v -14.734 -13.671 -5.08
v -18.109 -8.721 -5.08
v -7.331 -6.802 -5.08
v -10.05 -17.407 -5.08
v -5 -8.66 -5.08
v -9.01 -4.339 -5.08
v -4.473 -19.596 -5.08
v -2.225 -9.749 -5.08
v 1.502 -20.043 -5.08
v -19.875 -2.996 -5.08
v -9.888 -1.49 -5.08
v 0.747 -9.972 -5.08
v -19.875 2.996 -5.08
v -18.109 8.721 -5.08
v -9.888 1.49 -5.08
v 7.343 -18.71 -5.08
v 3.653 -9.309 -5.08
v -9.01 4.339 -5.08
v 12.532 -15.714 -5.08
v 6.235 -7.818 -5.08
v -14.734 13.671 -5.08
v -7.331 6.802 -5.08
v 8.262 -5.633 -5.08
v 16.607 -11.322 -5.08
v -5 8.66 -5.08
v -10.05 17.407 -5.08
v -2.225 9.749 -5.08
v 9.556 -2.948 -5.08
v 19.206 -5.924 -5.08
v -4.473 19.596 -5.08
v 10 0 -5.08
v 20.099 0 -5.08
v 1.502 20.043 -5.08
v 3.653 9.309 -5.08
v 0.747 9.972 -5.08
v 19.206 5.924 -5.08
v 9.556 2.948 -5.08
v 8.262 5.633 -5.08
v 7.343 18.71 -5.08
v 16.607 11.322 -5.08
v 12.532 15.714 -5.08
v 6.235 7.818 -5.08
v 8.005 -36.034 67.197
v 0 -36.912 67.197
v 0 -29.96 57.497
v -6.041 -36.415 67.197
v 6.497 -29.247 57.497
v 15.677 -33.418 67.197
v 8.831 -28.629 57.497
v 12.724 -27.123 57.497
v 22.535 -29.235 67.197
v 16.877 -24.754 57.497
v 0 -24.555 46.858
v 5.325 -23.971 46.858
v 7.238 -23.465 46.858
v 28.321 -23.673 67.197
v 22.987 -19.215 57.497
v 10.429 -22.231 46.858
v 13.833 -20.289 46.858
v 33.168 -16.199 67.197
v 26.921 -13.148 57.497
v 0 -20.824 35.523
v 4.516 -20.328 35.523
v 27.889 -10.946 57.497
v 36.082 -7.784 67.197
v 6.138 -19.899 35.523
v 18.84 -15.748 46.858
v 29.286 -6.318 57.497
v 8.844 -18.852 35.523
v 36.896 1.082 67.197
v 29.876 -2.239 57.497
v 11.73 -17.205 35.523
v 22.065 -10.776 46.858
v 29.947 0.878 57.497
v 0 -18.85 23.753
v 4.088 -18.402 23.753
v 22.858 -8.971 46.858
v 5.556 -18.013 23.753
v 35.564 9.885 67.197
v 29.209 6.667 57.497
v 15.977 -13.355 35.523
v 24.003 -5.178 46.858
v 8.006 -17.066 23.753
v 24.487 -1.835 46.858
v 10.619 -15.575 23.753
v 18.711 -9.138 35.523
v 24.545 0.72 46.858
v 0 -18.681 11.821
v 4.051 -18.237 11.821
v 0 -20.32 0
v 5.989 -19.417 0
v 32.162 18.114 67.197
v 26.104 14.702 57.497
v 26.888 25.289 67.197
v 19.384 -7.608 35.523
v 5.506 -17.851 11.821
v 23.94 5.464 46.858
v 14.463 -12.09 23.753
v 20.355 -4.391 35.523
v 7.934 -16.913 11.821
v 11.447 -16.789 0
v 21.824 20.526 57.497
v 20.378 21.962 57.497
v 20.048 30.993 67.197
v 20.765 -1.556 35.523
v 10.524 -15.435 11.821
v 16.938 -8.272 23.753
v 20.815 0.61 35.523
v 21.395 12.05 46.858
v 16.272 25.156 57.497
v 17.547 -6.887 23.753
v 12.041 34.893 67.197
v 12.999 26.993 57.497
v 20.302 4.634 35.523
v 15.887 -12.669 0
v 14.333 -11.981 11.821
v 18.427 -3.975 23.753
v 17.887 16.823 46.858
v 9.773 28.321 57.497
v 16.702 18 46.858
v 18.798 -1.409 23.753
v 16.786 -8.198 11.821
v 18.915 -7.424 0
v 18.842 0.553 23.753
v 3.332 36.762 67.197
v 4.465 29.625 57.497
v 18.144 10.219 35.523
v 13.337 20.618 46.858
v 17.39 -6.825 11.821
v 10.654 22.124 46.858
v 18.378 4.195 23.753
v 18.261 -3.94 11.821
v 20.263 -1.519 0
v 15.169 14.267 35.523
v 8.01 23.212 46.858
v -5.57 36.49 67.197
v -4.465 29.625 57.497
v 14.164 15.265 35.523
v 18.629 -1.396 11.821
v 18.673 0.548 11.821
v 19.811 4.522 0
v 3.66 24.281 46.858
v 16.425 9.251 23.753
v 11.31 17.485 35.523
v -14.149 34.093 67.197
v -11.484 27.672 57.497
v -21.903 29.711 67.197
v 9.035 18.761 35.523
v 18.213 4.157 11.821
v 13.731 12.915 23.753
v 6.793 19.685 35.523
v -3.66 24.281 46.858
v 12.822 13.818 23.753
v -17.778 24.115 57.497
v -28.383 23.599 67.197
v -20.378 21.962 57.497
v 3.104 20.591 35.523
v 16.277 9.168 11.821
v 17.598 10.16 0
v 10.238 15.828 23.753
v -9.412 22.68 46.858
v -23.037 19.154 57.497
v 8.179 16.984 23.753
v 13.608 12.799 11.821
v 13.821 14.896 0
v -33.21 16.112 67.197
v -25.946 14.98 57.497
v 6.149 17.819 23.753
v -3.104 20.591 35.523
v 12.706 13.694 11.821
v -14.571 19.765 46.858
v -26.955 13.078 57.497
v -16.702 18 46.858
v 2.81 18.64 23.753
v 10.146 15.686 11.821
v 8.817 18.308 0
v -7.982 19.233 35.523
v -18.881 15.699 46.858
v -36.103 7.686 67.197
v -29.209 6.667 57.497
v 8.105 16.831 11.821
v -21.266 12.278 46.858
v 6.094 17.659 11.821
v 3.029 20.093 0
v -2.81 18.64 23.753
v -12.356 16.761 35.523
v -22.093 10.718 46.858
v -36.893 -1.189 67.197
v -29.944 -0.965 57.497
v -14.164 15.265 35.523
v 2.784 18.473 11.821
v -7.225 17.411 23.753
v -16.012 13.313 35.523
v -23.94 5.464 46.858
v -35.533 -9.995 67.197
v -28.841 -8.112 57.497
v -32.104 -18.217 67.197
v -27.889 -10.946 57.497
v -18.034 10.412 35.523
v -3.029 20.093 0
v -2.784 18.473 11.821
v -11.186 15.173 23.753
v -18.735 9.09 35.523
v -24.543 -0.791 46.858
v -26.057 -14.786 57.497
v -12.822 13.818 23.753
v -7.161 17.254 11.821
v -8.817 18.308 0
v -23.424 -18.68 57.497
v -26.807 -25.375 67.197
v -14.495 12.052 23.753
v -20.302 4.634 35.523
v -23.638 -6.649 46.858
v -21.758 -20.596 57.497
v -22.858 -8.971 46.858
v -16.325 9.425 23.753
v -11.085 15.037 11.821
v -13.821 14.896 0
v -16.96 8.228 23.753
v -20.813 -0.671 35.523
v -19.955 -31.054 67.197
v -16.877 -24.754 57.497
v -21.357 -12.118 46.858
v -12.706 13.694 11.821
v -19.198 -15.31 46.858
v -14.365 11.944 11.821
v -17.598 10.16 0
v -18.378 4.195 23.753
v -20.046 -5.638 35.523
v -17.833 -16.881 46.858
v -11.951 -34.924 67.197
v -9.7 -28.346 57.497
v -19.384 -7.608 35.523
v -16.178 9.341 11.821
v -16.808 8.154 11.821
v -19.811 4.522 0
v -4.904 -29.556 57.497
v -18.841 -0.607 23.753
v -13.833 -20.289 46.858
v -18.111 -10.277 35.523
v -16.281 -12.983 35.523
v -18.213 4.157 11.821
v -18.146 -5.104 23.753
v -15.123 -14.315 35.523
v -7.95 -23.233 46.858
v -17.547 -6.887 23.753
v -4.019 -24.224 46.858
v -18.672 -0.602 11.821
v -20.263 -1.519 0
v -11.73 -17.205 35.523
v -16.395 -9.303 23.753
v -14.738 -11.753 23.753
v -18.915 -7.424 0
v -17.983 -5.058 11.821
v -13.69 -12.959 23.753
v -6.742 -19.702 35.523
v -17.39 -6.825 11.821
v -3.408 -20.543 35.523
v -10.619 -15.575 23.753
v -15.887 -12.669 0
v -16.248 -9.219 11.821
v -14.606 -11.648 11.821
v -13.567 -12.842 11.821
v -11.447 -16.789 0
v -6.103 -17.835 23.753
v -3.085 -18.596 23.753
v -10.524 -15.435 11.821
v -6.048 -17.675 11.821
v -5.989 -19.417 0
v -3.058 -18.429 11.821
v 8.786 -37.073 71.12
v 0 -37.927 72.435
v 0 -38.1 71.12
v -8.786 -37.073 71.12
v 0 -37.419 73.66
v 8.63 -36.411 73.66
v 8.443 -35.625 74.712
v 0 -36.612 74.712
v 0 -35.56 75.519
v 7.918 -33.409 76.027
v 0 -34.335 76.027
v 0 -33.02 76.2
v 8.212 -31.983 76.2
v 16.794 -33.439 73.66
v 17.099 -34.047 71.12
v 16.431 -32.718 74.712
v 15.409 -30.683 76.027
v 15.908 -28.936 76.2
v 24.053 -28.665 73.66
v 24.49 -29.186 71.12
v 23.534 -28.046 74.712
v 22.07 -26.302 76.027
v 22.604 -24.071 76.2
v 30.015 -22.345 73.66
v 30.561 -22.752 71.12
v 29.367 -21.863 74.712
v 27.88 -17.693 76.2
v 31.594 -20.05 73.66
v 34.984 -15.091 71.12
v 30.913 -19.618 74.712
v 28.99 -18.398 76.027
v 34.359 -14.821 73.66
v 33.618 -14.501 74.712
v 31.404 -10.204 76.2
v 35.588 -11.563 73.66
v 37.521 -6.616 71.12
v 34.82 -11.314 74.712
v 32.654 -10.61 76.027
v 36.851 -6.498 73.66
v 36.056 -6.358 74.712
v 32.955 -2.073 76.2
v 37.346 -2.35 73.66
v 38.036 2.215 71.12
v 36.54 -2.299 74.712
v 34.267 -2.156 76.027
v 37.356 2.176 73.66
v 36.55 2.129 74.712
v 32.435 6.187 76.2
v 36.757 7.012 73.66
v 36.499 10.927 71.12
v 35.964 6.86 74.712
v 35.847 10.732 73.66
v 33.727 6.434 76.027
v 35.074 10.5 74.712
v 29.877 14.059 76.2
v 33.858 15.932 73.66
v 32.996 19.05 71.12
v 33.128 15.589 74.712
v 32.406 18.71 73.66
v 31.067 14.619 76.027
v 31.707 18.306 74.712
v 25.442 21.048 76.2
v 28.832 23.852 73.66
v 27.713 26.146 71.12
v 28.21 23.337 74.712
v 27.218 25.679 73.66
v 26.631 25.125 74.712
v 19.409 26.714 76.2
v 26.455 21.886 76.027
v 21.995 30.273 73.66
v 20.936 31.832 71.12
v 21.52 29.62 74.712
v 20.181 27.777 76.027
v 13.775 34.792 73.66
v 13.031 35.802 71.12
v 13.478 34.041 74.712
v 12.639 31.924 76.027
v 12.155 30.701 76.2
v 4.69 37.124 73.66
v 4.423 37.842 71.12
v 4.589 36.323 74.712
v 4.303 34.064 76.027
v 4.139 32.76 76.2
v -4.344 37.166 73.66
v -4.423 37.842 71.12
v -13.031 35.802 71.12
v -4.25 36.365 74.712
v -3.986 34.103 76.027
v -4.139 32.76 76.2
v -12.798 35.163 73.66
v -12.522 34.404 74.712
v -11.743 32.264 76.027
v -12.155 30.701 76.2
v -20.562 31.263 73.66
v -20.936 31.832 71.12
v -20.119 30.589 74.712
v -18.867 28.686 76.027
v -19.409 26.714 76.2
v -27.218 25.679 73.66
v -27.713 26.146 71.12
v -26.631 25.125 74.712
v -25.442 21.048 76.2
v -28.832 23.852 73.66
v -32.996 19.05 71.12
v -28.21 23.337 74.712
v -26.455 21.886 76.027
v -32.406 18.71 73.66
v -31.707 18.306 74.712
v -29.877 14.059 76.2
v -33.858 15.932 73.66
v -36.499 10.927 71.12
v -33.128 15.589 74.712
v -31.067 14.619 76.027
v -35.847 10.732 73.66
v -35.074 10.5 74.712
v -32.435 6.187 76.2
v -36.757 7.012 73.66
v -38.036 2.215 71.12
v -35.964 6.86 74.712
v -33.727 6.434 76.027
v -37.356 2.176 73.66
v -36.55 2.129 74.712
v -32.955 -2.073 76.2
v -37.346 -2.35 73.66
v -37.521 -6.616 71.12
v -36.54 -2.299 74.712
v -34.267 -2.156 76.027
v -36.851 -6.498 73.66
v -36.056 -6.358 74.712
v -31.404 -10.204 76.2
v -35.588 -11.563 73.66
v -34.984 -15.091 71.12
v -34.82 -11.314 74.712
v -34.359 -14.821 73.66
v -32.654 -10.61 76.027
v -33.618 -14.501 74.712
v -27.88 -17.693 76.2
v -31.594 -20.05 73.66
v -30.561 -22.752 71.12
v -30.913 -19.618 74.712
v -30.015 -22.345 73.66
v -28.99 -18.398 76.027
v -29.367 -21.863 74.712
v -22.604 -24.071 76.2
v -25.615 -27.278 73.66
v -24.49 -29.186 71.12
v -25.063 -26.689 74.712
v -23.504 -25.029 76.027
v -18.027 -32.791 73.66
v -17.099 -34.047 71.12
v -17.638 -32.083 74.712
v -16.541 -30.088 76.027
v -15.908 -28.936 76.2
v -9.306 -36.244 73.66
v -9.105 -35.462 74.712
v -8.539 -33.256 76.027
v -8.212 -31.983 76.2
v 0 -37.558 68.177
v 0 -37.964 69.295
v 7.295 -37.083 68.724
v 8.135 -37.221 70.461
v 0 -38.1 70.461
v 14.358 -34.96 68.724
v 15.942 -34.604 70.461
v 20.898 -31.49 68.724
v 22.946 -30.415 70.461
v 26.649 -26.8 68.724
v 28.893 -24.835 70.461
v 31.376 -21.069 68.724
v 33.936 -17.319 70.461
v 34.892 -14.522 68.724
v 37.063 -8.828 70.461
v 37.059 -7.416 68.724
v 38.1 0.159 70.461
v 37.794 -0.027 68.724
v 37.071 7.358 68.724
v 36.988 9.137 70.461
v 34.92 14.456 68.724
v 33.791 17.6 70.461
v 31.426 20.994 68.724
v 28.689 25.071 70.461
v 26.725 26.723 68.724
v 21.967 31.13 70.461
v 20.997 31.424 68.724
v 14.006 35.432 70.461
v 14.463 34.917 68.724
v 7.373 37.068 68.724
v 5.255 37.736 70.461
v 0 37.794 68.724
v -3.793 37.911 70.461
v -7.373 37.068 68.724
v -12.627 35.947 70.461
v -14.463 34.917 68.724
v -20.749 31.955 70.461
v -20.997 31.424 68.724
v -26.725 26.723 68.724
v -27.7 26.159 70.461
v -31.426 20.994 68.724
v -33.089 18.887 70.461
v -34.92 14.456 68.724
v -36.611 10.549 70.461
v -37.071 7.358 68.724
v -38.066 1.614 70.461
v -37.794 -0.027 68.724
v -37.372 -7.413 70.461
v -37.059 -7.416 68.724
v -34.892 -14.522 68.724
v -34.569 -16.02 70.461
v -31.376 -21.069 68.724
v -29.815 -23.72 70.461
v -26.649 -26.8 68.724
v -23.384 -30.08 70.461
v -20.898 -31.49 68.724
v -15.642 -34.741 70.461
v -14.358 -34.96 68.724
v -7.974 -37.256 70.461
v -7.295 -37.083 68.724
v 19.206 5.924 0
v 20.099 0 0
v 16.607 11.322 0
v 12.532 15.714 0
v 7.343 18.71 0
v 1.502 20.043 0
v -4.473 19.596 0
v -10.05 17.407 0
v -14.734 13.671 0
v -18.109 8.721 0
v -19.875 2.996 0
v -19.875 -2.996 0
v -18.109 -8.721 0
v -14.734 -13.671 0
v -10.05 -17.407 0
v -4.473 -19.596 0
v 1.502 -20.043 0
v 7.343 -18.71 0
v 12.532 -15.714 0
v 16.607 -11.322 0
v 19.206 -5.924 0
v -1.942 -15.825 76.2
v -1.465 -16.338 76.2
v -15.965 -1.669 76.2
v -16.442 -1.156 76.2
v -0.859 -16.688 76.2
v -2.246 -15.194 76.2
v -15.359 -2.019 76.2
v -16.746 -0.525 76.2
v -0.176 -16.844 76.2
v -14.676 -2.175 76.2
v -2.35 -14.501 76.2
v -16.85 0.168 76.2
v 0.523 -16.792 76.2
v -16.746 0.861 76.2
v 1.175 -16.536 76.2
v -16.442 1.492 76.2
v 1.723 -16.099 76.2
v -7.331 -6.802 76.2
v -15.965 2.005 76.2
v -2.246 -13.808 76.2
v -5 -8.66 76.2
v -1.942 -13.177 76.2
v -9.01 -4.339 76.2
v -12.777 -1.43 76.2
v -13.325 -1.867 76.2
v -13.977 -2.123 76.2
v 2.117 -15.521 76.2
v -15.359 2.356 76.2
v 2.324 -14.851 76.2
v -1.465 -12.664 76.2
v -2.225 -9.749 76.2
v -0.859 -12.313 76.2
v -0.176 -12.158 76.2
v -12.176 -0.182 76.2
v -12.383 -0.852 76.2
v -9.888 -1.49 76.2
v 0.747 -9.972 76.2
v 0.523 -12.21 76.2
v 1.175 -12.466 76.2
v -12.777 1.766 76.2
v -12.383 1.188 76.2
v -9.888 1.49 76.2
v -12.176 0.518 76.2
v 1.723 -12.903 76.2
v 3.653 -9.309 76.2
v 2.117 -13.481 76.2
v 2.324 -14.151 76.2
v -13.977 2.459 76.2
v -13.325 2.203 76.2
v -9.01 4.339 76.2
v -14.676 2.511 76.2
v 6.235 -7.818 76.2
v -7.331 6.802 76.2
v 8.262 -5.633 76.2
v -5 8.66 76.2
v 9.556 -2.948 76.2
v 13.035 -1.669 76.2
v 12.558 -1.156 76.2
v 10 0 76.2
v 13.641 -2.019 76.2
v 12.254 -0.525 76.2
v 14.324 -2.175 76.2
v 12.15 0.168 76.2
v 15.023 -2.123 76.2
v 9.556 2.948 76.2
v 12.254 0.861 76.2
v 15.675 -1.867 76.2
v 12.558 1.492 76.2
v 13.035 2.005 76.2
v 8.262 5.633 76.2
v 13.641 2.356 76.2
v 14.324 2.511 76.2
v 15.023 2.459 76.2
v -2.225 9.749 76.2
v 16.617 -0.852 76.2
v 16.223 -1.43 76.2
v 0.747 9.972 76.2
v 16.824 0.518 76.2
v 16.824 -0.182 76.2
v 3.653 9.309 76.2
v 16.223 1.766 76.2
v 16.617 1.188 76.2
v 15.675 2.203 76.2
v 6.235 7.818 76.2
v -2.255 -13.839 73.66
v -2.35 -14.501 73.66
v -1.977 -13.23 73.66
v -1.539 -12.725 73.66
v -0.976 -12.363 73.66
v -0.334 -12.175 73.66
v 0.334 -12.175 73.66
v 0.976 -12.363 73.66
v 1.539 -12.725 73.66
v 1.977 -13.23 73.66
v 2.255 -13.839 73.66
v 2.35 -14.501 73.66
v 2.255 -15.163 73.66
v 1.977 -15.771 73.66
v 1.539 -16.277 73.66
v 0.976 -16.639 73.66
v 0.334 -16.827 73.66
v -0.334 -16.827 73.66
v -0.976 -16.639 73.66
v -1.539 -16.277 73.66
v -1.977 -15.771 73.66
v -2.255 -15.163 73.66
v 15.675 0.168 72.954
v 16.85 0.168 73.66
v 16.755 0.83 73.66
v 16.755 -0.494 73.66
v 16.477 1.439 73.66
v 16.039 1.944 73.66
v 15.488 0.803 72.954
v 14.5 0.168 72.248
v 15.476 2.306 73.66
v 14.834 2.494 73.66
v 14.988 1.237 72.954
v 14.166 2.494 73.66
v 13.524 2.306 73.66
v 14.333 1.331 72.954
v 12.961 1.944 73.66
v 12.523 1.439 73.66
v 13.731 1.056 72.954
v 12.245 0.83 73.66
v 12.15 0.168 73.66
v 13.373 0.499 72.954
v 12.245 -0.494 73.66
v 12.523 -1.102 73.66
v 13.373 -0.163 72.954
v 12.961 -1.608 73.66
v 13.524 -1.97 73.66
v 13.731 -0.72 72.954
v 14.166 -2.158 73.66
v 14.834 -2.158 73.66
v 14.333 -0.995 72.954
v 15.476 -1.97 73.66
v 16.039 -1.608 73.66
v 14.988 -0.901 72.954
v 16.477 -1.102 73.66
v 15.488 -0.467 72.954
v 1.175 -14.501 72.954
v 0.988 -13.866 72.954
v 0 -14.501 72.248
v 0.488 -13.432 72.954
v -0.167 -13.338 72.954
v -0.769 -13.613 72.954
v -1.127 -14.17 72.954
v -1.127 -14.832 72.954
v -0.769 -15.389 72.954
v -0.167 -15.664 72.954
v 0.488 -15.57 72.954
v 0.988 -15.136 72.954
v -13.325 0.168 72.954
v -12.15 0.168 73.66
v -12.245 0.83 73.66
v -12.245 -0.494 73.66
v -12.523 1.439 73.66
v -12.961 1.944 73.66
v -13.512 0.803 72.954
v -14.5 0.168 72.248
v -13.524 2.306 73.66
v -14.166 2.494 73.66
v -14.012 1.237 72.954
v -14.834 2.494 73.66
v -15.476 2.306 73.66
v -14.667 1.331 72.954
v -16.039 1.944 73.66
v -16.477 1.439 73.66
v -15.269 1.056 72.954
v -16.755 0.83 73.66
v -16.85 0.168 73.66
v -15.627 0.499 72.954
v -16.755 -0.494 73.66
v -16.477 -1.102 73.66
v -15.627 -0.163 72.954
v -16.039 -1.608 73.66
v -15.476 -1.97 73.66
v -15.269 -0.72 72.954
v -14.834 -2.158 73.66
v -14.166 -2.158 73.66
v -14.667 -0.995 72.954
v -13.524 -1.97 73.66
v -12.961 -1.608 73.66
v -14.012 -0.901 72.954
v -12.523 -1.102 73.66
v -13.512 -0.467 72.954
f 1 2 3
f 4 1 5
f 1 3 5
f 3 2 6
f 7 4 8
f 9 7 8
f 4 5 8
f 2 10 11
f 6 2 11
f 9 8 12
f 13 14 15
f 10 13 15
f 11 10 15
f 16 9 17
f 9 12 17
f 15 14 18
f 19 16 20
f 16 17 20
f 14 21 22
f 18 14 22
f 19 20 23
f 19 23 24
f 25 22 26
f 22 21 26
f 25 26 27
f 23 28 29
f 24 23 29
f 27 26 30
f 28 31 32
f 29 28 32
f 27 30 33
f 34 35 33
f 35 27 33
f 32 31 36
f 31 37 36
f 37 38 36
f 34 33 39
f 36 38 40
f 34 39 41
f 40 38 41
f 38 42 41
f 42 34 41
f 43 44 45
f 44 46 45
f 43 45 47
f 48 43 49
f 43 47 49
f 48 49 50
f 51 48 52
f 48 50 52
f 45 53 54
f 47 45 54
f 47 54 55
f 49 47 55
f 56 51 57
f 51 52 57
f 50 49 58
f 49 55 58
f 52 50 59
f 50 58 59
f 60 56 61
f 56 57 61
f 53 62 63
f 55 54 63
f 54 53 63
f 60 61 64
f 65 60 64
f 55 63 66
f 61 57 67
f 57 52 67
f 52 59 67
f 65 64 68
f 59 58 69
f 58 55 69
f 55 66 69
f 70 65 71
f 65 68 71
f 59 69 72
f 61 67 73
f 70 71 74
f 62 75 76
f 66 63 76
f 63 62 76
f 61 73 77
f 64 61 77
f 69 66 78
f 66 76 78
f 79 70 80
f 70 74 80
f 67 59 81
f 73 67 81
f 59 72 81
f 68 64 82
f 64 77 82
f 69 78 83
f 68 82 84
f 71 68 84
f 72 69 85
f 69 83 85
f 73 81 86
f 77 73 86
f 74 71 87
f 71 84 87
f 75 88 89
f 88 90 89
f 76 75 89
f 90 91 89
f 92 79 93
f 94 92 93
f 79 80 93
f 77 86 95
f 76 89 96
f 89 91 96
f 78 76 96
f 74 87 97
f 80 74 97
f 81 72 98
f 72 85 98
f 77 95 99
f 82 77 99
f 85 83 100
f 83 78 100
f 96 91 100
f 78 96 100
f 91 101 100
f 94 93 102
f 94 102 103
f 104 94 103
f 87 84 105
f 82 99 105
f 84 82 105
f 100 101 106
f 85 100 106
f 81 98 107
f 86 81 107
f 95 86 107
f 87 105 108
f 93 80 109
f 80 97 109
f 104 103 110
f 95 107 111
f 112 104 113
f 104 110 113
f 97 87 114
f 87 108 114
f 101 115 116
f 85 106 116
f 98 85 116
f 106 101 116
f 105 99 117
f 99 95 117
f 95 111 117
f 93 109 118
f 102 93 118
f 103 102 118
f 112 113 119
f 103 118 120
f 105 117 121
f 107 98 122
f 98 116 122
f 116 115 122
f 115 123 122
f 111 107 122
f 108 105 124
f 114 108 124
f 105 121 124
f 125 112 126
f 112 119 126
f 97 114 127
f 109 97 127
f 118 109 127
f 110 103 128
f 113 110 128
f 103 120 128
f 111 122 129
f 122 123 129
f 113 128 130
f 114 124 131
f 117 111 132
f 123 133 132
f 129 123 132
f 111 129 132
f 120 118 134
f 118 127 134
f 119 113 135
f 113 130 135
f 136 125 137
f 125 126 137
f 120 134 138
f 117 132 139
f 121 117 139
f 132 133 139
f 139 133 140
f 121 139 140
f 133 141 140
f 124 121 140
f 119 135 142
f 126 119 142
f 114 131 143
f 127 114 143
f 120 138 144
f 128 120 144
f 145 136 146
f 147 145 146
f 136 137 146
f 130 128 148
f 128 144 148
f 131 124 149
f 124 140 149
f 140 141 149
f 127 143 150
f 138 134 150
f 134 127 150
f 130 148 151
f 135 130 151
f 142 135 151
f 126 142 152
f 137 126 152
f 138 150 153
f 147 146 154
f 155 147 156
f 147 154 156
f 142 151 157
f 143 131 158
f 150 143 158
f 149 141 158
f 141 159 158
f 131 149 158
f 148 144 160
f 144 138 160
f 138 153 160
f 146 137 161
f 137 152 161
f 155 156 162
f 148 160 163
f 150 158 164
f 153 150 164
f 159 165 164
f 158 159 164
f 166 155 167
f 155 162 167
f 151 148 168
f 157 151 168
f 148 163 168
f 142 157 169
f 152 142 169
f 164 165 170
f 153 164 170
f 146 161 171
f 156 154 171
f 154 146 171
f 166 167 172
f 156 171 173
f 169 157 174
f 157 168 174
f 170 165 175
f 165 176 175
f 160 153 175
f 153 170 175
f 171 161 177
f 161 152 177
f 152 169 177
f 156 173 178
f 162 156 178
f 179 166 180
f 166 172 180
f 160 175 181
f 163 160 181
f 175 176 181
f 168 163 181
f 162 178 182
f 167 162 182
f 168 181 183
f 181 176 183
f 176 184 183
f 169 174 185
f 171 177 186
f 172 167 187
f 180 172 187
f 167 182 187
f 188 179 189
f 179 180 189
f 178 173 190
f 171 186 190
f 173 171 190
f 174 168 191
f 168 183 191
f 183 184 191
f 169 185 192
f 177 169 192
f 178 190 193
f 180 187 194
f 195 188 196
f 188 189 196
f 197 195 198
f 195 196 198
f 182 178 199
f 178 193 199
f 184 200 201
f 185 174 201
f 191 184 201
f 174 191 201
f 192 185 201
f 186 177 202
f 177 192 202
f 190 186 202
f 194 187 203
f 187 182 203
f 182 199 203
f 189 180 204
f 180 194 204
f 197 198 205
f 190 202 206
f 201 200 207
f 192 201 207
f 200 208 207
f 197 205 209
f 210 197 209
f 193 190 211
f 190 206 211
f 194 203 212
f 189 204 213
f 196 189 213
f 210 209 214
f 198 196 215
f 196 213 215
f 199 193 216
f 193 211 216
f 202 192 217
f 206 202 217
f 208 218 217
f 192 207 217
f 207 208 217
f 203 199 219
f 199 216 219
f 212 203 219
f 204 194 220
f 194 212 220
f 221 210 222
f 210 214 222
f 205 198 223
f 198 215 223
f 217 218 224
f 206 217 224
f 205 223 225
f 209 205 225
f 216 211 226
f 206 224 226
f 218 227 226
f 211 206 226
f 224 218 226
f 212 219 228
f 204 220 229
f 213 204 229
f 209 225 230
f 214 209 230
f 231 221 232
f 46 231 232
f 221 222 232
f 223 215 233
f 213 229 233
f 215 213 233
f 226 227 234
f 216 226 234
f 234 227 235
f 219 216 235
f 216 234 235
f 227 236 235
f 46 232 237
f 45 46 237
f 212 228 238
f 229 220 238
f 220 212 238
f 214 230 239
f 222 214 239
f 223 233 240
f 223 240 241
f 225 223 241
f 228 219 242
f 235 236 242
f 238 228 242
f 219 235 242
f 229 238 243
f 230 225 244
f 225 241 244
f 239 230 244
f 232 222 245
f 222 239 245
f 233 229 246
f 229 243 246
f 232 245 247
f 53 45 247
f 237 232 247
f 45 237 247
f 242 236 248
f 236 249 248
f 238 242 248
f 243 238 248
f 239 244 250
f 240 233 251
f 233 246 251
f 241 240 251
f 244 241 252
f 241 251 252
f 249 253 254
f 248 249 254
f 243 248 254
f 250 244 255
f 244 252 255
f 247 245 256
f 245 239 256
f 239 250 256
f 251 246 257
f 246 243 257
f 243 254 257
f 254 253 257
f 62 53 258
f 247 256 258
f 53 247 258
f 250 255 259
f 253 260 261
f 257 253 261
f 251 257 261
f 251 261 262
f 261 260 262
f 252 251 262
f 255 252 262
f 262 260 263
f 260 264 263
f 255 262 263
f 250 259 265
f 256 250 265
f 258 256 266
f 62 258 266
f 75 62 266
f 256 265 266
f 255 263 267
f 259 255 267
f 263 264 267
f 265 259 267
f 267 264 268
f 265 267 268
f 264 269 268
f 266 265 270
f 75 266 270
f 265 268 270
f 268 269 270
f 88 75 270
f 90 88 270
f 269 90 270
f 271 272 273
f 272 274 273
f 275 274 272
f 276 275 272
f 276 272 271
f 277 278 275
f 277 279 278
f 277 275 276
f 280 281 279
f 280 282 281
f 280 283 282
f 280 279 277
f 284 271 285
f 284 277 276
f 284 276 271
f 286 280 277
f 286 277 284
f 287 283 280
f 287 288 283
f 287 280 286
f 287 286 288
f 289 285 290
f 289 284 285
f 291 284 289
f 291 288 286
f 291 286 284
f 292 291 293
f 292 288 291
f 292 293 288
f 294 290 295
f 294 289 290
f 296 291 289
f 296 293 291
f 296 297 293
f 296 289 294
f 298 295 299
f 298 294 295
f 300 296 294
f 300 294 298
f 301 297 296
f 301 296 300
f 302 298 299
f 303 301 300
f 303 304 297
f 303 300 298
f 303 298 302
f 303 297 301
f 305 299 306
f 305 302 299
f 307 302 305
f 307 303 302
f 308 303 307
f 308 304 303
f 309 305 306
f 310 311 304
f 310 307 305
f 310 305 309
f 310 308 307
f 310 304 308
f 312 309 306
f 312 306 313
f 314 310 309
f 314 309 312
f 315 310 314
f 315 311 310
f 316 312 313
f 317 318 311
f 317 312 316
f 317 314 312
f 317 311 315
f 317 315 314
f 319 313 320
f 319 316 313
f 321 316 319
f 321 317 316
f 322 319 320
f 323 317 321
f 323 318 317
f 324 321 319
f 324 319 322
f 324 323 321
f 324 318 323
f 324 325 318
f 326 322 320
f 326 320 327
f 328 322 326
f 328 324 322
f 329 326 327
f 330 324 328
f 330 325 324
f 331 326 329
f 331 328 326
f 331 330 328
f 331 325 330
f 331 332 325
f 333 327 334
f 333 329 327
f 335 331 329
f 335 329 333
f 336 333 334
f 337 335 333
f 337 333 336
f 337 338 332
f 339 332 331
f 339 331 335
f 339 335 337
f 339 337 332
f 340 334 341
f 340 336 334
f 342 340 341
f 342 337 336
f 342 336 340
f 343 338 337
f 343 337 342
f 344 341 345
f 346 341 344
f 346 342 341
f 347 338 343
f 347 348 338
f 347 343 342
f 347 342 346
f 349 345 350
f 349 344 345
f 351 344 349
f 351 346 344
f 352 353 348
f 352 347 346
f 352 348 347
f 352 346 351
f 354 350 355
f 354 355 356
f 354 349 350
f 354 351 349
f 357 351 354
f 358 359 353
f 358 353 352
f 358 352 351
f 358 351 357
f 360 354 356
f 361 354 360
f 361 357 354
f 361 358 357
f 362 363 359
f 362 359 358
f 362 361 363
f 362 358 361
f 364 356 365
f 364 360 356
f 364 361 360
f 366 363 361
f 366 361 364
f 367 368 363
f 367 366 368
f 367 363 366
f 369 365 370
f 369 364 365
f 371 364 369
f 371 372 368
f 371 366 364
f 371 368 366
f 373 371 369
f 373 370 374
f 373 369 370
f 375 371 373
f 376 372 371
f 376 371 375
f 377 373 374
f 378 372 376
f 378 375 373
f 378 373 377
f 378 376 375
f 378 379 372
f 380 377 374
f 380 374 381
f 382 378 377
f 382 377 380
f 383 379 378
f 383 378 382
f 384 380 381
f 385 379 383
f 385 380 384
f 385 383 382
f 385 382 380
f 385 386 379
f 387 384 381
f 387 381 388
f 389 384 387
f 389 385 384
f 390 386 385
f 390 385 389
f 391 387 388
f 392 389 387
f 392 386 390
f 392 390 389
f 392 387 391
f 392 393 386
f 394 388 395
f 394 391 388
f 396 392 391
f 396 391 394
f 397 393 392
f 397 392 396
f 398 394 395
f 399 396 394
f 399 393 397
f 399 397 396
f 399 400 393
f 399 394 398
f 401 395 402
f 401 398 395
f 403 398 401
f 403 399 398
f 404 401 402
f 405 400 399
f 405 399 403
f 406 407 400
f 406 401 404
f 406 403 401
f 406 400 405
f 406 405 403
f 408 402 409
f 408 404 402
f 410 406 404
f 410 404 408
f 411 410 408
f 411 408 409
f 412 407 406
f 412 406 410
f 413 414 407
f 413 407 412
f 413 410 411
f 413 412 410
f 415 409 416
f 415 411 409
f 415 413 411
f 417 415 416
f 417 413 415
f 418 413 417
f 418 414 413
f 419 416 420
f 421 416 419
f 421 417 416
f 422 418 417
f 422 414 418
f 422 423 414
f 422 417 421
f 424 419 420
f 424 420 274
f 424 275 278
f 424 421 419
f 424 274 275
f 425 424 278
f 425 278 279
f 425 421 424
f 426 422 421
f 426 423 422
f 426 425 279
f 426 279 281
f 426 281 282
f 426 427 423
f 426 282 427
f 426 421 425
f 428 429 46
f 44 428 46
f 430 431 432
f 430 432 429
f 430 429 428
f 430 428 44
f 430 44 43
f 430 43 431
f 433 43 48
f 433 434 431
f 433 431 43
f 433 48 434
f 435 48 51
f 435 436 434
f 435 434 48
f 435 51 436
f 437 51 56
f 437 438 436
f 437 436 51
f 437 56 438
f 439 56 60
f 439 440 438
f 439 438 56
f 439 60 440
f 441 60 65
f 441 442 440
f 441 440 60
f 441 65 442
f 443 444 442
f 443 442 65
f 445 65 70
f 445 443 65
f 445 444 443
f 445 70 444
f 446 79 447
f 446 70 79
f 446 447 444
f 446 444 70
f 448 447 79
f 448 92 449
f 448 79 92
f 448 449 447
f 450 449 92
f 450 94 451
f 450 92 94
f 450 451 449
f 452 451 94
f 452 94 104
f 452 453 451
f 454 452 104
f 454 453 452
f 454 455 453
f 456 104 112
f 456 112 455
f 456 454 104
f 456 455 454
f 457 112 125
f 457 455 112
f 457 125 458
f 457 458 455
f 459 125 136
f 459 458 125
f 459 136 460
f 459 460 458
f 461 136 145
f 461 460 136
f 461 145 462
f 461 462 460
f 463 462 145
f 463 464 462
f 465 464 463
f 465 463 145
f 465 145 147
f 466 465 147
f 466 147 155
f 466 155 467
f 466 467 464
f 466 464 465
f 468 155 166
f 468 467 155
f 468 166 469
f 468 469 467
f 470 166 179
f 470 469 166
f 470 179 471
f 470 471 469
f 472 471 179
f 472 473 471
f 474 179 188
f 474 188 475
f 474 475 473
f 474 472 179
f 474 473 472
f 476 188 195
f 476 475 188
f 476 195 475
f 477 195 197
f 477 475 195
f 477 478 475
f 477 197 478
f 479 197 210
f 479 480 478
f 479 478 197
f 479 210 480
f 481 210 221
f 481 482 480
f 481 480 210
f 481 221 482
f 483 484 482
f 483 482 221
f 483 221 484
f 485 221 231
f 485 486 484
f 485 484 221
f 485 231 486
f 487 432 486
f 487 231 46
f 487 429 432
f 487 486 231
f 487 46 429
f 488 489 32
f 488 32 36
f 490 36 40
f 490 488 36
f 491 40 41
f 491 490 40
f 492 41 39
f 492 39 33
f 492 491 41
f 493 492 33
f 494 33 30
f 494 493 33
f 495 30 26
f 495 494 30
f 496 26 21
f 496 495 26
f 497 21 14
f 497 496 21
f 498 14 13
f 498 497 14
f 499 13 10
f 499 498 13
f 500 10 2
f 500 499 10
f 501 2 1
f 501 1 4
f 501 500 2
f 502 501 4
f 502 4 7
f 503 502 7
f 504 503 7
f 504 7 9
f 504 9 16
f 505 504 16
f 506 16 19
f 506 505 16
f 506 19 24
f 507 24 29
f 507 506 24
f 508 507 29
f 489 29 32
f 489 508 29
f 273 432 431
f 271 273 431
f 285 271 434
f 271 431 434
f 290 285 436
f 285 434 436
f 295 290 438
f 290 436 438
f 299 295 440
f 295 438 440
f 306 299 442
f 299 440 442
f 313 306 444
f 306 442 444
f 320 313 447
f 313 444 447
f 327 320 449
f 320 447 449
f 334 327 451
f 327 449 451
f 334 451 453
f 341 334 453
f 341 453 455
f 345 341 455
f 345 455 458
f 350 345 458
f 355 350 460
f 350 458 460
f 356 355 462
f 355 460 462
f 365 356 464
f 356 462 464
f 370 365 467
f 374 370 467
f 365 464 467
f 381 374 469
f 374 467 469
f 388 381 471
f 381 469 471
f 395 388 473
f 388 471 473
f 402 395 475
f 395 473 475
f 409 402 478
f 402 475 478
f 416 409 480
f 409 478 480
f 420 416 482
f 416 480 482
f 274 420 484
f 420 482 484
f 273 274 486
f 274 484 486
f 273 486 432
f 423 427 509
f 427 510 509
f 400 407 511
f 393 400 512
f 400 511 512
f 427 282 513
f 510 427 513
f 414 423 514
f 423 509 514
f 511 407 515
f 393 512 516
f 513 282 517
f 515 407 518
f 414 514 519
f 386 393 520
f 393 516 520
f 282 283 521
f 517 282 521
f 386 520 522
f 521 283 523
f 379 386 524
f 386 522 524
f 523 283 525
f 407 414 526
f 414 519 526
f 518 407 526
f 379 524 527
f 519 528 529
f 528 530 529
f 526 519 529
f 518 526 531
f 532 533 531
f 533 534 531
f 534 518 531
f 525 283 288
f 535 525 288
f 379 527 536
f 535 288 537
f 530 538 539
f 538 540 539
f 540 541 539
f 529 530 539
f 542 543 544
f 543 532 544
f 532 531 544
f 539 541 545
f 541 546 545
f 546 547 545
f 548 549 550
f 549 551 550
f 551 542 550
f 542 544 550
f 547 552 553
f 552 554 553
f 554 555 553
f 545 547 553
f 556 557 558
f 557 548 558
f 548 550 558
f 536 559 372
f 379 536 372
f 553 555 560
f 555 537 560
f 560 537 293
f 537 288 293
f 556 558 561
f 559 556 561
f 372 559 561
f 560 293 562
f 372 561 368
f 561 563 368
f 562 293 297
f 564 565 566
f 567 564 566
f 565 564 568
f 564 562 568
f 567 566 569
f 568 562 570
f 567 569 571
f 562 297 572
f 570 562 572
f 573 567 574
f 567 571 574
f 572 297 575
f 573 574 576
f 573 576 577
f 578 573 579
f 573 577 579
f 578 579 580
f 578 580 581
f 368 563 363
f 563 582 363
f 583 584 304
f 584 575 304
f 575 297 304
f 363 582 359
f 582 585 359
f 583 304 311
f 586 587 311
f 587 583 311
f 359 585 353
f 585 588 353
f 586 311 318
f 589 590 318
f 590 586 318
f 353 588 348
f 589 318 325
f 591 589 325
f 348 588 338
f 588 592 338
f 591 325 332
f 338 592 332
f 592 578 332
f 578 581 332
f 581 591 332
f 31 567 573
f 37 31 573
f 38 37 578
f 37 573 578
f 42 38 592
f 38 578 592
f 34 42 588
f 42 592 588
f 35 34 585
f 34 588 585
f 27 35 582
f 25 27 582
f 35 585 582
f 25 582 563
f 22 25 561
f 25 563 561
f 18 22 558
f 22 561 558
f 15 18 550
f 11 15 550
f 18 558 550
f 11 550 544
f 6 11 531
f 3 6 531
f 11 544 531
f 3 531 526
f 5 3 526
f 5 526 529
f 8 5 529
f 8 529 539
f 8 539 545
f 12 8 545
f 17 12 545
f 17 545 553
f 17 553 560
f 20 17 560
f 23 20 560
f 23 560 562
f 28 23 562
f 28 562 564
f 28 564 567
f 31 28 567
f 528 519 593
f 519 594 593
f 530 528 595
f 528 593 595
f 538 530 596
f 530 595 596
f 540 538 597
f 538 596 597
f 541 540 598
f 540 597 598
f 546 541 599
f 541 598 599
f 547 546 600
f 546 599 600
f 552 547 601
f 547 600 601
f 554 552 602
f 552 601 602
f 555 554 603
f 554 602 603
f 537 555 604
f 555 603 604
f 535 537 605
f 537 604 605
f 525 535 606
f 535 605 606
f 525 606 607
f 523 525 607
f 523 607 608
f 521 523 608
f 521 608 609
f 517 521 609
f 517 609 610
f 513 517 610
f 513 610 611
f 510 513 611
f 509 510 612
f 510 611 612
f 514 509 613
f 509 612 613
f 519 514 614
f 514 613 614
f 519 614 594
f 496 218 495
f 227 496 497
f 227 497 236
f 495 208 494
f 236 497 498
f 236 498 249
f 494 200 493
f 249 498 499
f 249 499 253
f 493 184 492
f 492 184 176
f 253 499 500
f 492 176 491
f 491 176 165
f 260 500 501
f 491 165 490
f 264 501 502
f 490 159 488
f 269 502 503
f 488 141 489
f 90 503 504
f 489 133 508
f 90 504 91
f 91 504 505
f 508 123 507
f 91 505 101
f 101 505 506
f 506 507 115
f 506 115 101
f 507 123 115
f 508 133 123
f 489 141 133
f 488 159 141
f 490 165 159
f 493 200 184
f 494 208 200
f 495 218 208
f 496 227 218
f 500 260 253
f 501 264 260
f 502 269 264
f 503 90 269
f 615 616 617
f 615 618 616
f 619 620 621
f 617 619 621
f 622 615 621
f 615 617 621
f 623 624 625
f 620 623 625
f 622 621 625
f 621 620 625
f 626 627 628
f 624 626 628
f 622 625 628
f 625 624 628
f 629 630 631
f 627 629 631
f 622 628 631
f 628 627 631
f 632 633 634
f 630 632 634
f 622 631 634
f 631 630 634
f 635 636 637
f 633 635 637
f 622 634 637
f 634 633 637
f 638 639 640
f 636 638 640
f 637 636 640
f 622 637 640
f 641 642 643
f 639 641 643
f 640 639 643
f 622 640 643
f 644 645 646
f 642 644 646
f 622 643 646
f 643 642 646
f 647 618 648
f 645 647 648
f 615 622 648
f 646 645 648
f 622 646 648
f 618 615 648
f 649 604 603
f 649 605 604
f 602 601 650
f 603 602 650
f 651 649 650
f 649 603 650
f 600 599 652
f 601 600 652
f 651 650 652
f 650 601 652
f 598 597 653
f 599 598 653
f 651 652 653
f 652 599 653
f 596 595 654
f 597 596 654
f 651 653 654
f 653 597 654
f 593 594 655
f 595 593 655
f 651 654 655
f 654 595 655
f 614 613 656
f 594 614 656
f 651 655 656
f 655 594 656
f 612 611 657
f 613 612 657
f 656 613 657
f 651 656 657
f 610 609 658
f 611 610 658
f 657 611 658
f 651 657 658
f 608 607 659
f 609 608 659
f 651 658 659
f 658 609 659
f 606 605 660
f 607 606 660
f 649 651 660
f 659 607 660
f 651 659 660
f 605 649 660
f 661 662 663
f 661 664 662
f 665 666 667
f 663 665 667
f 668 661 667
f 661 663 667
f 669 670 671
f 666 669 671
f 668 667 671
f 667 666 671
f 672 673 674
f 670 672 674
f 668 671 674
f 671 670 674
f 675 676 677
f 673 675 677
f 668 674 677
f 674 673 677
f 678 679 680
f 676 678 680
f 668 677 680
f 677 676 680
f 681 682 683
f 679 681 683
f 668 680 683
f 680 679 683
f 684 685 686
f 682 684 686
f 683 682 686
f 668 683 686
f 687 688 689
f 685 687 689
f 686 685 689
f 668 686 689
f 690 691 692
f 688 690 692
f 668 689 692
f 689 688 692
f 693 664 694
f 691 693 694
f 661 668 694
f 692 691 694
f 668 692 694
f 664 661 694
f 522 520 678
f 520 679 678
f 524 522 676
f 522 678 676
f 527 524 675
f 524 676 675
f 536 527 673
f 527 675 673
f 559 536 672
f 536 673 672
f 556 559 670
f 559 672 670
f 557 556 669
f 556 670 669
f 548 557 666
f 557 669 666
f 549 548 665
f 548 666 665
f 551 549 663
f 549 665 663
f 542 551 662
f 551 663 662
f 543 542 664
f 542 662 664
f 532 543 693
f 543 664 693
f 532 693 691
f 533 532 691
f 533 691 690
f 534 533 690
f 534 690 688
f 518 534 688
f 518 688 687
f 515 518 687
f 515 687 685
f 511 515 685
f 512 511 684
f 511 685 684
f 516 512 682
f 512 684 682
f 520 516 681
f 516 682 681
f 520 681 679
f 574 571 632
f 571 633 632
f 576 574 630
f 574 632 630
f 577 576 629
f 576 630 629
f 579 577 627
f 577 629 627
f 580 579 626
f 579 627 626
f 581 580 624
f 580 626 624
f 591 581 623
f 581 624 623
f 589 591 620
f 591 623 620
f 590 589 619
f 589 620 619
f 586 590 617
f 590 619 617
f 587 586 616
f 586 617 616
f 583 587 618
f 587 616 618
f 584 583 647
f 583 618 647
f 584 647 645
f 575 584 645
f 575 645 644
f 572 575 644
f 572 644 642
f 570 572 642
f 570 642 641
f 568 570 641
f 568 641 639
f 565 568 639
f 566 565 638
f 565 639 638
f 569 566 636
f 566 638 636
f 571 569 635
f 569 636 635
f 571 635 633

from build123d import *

# Parameters (mm, degrees)
F3_R      = 20.0994613734
F4_DEPTH  = 5.08
F5_DEPTH  = 7.62
F6_R      = 5.08
F8_D      = 4.6999906
F8_DEPTH  = 2.54
F8_TIP    = 1.4120196307
F9_R      = 10.0000054
F10_DEPTH = 81.281


with BuildPart() as f2:
    # F0 (on Right) → F2 (revolve)
    with BuildSketch(Plane.YZ):
        with BuildLine():
            Line((-10.16, 0), (0, 0))
            Line((0, 0), (0, 68.58))
            Line((0, 68.58), (-38.1, 68.58))
            ThreePointArc((-38.1, 68.58), (-21.0473280724, 36.4062482775), (-20.32, 0))
            Line((-20.32, 0), (-10.16, 0))
        make_face()
    revolve(axis=Axis((0, 0, 21.4434694499), (0, 0, 1)))

    # F3 (on Top) → F4 (join)
    with BuildSketch(Plane.XY):
        Circle(F3_R)
    extrude(amount=-F4_DEPTH)

    # F5 (add): a face of the model
    f5_faces = [f2.faces().sort_by_distance(p)[0] for p in [
        (0, 0, 68.58),
    ]]
    extrude(f5_faces, amount=F5_DEPTH)

    # F6
    f6_edges = [f2.edges().sort_by_distance(p)[0] for p in [
        (0, 38.1, 76.2),
        (0, 38.1, 68.58),
    ]]
    fillet(f6_edges, radius=F6_R)

    # F8
    with Locations(Plane.XY.offset(76.2)):
        with Locations((14.499971, 0.168066554), (-14.499971, 0.168066554), (0, -14.5009449819)):
            Hole(F8_D / 2, depth=F8_DEPTH)
            with Locations((0, 0, -(F8_DEPTH + F8_TIP / 2))):  # 118° drill point
                Cone(0, F8_D / 2, F8_TIP, mode=Mode.SUBTRACT)

    # F9 (on face) → F10 (cut, through all)
    with BuildSketch(Plane.XY.offset(76.2)):
        Circle(F9_R)
    extrude(amount=-F10_DEPTH, mode=Mode.SUBTRACT)


solid = f2.part
